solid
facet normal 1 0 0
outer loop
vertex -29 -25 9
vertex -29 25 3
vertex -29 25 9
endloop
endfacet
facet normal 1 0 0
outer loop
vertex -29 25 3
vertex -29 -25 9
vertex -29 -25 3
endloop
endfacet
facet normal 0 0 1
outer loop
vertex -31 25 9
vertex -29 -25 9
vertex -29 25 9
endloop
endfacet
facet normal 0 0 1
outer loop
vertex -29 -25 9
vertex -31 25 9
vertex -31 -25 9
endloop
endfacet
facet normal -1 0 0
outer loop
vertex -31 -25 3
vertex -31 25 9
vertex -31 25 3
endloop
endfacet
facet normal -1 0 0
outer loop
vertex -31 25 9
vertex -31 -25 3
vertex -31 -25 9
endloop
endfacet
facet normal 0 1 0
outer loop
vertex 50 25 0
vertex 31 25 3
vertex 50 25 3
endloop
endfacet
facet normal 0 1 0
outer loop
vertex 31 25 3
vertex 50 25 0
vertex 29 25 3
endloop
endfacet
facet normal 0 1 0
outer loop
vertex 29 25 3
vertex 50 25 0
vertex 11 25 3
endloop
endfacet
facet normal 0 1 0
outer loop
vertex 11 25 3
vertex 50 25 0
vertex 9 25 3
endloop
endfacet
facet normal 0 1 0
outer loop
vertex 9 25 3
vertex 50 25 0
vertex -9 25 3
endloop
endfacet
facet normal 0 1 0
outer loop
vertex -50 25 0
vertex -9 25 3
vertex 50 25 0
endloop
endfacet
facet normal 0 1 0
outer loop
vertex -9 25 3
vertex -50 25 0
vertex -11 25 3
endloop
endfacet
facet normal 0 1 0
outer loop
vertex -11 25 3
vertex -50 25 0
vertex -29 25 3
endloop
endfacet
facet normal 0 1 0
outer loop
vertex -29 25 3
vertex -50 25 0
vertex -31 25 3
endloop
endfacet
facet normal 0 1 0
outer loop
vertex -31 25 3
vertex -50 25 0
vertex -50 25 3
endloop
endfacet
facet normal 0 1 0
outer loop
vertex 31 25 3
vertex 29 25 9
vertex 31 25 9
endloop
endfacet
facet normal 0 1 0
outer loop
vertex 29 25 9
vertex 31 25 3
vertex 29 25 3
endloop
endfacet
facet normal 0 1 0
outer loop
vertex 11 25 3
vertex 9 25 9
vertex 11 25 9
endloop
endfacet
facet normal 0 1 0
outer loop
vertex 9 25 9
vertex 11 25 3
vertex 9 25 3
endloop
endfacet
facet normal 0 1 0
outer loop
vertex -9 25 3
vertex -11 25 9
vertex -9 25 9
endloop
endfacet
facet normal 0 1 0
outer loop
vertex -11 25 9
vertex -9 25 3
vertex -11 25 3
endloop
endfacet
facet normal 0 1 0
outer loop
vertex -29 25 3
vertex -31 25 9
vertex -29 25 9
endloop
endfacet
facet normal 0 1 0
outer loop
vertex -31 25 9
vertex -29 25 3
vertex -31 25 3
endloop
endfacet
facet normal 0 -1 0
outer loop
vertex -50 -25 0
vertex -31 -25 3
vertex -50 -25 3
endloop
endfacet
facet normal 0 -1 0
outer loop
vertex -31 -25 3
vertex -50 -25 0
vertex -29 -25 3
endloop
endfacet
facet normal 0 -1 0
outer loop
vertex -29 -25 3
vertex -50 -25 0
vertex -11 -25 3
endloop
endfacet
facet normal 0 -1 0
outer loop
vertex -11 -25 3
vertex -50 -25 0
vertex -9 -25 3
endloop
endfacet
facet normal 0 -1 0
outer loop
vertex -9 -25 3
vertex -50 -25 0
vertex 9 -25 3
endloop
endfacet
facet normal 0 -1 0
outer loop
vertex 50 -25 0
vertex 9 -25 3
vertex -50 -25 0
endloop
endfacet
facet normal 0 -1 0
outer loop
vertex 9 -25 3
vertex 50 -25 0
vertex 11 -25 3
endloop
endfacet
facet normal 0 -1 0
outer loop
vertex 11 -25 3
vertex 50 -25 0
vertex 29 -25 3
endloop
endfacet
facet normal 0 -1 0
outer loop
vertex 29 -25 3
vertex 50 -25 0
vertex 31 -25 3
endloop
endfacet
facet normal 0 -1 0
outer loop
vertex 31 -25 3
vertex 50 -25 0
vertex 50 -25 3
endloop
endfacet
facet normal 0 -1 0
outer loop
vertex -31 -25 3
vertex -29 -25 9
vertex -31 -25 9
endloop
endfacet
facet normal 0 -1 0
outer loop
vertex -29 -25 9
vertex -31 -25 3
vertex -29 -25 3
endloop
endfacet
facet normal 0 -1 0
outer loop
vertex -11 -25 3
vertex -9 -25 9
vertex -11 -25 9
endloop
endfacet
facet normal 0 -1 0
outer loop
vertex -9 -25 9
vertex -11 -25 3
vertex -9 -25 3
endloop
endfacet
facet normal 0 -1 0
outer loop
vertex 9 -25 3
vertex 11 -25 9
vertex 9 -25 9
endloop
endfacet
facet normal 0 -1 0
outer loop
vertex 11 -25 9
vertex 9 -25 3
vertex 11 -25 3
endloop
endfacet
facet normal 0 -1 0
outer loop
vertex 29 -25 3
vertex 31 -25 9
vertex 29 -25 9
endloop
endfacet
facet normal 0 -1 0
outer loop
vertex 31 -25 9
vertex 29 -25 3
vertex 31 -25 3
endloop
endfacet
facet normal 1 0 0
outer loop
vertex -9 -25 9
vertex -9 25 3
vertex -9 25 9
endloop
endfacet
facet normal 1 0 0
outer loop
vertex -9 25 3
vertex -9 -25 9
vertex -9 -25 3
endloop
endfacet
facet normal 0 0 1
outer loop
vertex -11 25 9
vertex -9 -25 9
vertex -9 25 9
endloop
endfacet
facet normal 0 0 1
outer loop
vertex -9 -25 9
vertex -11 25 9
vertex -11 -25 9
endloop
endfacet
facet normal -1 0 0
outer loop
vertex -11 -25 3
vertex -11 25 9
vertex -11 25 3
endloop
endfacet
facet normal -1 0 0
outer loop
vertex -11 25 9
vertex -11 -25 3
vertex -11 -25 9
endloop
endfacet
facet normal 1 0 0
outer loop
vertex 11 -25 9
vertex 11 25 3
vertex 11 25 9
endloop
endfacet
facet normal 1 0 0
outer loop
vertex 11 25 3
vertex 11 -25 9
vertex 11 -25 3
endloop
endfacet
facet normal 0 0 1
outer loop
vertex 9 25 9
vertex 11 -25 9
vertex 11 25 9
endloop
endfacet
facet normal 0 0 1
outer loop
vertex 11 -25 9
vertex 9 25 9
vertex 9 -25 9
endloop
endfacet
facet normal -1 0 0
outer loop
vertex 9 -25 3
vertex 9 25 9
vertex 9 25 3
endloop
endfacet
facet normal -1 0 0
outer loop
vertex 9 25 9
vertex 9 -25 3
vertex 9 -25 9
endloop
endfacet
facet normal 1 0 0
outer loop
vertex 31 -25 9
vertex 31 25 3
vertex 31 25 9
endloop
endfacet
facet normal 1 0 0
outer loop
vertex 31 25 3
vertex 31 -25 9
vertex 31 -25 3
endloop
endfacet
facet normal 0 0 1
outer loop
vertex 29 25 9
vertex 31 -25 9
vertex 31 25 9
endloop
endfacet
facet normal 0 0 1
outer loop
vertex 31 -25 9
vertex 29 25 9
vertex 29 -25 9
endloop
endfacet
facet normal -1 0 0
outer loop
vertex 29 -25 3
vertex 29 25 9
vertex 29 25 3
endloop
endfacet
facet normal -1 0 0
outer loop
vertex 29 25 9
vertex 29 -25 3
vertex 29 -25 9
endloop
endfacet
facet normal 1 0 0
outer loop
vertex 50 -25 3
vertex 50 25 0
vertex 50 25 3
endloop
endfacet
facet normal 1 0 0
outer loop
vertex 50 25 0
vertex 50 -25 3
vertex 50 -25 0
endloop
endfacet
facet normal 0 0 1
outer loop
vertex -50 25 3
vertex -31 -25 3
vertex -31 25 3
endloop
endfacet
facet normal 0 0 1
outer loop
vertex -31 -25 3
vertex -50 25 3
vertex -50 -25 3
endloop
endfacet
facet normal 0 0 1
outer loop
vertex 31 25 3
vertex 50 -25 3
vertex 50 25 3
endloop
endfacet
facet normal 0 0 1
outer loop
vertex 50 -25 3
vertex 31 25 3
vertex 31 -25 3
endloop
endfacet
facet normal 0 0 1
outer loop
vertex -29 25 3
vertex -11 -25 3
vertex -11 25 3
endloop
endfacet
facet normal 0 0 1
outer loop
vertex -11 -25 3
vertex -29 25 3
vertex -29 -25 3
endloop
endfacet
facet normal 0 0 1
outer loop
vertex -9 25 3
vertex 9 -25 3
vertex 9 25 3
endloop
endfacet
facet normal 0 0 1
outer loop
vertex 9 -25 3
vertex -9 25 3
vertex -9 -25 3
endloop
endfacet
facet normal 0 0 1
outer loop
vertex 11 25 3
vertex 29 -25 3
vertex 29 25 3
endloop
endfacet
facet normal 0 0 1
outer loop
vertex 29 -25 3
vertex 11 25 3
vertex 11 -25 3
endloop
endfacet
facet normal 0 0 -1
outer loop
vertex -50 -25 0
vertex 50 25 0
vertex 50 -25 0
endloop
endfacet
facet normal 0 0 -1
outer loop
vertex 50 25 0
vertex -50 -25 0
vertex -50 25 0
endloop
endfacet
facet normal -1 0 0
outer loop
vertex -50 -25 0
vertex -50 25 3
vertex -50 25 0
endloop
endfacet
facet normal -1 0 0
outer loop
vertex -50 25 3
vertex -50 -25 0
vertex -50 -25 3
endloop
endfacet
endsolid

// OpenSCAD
// Stiffened cover panel
// Print orientation: plate flat on bed, ribs pointing up (+Z)

// ---------------- Parameters ----------------
plate_len   = 100;  // plate length along X (mm)
plate_wid   = 50;   // plate width along Y (mm)
plate_thk   = 3;    // plate thickness, z = 0..3 (mm)

rib_count   = 4;    // number of ribs
rib_thk     = 2;    // rib thickness along X (mm)
rib_h       = 6;    // rib height above plate, z = 3..9 (mm)
rib_pitch   = plate_len / (rib_count + 1); // 20 mm centre spacing
rib_overlap = 0.01; // small overlap into plate for a clean union (mm)

// ---------------- Model ----------------
union() {
    // Base plate
    translate([-plate_len/2, -plate_wid/2, 0])
        cube([plate_len, plate_wid, plate_thk]);

    // Ribs: centres at x = -30, -10, 10, 30
    for (i = [0 : rib_count - 1]) {
        x_c = -plate_len/2 + rib_pitch * (i + 1);
        translate([x_c - rib_thk/2, -plate_wid/2, plate_thk - rib_overlap])
            cube([rib_thk, plate_wid, rib_h + rib_overlap]);
    }
}
